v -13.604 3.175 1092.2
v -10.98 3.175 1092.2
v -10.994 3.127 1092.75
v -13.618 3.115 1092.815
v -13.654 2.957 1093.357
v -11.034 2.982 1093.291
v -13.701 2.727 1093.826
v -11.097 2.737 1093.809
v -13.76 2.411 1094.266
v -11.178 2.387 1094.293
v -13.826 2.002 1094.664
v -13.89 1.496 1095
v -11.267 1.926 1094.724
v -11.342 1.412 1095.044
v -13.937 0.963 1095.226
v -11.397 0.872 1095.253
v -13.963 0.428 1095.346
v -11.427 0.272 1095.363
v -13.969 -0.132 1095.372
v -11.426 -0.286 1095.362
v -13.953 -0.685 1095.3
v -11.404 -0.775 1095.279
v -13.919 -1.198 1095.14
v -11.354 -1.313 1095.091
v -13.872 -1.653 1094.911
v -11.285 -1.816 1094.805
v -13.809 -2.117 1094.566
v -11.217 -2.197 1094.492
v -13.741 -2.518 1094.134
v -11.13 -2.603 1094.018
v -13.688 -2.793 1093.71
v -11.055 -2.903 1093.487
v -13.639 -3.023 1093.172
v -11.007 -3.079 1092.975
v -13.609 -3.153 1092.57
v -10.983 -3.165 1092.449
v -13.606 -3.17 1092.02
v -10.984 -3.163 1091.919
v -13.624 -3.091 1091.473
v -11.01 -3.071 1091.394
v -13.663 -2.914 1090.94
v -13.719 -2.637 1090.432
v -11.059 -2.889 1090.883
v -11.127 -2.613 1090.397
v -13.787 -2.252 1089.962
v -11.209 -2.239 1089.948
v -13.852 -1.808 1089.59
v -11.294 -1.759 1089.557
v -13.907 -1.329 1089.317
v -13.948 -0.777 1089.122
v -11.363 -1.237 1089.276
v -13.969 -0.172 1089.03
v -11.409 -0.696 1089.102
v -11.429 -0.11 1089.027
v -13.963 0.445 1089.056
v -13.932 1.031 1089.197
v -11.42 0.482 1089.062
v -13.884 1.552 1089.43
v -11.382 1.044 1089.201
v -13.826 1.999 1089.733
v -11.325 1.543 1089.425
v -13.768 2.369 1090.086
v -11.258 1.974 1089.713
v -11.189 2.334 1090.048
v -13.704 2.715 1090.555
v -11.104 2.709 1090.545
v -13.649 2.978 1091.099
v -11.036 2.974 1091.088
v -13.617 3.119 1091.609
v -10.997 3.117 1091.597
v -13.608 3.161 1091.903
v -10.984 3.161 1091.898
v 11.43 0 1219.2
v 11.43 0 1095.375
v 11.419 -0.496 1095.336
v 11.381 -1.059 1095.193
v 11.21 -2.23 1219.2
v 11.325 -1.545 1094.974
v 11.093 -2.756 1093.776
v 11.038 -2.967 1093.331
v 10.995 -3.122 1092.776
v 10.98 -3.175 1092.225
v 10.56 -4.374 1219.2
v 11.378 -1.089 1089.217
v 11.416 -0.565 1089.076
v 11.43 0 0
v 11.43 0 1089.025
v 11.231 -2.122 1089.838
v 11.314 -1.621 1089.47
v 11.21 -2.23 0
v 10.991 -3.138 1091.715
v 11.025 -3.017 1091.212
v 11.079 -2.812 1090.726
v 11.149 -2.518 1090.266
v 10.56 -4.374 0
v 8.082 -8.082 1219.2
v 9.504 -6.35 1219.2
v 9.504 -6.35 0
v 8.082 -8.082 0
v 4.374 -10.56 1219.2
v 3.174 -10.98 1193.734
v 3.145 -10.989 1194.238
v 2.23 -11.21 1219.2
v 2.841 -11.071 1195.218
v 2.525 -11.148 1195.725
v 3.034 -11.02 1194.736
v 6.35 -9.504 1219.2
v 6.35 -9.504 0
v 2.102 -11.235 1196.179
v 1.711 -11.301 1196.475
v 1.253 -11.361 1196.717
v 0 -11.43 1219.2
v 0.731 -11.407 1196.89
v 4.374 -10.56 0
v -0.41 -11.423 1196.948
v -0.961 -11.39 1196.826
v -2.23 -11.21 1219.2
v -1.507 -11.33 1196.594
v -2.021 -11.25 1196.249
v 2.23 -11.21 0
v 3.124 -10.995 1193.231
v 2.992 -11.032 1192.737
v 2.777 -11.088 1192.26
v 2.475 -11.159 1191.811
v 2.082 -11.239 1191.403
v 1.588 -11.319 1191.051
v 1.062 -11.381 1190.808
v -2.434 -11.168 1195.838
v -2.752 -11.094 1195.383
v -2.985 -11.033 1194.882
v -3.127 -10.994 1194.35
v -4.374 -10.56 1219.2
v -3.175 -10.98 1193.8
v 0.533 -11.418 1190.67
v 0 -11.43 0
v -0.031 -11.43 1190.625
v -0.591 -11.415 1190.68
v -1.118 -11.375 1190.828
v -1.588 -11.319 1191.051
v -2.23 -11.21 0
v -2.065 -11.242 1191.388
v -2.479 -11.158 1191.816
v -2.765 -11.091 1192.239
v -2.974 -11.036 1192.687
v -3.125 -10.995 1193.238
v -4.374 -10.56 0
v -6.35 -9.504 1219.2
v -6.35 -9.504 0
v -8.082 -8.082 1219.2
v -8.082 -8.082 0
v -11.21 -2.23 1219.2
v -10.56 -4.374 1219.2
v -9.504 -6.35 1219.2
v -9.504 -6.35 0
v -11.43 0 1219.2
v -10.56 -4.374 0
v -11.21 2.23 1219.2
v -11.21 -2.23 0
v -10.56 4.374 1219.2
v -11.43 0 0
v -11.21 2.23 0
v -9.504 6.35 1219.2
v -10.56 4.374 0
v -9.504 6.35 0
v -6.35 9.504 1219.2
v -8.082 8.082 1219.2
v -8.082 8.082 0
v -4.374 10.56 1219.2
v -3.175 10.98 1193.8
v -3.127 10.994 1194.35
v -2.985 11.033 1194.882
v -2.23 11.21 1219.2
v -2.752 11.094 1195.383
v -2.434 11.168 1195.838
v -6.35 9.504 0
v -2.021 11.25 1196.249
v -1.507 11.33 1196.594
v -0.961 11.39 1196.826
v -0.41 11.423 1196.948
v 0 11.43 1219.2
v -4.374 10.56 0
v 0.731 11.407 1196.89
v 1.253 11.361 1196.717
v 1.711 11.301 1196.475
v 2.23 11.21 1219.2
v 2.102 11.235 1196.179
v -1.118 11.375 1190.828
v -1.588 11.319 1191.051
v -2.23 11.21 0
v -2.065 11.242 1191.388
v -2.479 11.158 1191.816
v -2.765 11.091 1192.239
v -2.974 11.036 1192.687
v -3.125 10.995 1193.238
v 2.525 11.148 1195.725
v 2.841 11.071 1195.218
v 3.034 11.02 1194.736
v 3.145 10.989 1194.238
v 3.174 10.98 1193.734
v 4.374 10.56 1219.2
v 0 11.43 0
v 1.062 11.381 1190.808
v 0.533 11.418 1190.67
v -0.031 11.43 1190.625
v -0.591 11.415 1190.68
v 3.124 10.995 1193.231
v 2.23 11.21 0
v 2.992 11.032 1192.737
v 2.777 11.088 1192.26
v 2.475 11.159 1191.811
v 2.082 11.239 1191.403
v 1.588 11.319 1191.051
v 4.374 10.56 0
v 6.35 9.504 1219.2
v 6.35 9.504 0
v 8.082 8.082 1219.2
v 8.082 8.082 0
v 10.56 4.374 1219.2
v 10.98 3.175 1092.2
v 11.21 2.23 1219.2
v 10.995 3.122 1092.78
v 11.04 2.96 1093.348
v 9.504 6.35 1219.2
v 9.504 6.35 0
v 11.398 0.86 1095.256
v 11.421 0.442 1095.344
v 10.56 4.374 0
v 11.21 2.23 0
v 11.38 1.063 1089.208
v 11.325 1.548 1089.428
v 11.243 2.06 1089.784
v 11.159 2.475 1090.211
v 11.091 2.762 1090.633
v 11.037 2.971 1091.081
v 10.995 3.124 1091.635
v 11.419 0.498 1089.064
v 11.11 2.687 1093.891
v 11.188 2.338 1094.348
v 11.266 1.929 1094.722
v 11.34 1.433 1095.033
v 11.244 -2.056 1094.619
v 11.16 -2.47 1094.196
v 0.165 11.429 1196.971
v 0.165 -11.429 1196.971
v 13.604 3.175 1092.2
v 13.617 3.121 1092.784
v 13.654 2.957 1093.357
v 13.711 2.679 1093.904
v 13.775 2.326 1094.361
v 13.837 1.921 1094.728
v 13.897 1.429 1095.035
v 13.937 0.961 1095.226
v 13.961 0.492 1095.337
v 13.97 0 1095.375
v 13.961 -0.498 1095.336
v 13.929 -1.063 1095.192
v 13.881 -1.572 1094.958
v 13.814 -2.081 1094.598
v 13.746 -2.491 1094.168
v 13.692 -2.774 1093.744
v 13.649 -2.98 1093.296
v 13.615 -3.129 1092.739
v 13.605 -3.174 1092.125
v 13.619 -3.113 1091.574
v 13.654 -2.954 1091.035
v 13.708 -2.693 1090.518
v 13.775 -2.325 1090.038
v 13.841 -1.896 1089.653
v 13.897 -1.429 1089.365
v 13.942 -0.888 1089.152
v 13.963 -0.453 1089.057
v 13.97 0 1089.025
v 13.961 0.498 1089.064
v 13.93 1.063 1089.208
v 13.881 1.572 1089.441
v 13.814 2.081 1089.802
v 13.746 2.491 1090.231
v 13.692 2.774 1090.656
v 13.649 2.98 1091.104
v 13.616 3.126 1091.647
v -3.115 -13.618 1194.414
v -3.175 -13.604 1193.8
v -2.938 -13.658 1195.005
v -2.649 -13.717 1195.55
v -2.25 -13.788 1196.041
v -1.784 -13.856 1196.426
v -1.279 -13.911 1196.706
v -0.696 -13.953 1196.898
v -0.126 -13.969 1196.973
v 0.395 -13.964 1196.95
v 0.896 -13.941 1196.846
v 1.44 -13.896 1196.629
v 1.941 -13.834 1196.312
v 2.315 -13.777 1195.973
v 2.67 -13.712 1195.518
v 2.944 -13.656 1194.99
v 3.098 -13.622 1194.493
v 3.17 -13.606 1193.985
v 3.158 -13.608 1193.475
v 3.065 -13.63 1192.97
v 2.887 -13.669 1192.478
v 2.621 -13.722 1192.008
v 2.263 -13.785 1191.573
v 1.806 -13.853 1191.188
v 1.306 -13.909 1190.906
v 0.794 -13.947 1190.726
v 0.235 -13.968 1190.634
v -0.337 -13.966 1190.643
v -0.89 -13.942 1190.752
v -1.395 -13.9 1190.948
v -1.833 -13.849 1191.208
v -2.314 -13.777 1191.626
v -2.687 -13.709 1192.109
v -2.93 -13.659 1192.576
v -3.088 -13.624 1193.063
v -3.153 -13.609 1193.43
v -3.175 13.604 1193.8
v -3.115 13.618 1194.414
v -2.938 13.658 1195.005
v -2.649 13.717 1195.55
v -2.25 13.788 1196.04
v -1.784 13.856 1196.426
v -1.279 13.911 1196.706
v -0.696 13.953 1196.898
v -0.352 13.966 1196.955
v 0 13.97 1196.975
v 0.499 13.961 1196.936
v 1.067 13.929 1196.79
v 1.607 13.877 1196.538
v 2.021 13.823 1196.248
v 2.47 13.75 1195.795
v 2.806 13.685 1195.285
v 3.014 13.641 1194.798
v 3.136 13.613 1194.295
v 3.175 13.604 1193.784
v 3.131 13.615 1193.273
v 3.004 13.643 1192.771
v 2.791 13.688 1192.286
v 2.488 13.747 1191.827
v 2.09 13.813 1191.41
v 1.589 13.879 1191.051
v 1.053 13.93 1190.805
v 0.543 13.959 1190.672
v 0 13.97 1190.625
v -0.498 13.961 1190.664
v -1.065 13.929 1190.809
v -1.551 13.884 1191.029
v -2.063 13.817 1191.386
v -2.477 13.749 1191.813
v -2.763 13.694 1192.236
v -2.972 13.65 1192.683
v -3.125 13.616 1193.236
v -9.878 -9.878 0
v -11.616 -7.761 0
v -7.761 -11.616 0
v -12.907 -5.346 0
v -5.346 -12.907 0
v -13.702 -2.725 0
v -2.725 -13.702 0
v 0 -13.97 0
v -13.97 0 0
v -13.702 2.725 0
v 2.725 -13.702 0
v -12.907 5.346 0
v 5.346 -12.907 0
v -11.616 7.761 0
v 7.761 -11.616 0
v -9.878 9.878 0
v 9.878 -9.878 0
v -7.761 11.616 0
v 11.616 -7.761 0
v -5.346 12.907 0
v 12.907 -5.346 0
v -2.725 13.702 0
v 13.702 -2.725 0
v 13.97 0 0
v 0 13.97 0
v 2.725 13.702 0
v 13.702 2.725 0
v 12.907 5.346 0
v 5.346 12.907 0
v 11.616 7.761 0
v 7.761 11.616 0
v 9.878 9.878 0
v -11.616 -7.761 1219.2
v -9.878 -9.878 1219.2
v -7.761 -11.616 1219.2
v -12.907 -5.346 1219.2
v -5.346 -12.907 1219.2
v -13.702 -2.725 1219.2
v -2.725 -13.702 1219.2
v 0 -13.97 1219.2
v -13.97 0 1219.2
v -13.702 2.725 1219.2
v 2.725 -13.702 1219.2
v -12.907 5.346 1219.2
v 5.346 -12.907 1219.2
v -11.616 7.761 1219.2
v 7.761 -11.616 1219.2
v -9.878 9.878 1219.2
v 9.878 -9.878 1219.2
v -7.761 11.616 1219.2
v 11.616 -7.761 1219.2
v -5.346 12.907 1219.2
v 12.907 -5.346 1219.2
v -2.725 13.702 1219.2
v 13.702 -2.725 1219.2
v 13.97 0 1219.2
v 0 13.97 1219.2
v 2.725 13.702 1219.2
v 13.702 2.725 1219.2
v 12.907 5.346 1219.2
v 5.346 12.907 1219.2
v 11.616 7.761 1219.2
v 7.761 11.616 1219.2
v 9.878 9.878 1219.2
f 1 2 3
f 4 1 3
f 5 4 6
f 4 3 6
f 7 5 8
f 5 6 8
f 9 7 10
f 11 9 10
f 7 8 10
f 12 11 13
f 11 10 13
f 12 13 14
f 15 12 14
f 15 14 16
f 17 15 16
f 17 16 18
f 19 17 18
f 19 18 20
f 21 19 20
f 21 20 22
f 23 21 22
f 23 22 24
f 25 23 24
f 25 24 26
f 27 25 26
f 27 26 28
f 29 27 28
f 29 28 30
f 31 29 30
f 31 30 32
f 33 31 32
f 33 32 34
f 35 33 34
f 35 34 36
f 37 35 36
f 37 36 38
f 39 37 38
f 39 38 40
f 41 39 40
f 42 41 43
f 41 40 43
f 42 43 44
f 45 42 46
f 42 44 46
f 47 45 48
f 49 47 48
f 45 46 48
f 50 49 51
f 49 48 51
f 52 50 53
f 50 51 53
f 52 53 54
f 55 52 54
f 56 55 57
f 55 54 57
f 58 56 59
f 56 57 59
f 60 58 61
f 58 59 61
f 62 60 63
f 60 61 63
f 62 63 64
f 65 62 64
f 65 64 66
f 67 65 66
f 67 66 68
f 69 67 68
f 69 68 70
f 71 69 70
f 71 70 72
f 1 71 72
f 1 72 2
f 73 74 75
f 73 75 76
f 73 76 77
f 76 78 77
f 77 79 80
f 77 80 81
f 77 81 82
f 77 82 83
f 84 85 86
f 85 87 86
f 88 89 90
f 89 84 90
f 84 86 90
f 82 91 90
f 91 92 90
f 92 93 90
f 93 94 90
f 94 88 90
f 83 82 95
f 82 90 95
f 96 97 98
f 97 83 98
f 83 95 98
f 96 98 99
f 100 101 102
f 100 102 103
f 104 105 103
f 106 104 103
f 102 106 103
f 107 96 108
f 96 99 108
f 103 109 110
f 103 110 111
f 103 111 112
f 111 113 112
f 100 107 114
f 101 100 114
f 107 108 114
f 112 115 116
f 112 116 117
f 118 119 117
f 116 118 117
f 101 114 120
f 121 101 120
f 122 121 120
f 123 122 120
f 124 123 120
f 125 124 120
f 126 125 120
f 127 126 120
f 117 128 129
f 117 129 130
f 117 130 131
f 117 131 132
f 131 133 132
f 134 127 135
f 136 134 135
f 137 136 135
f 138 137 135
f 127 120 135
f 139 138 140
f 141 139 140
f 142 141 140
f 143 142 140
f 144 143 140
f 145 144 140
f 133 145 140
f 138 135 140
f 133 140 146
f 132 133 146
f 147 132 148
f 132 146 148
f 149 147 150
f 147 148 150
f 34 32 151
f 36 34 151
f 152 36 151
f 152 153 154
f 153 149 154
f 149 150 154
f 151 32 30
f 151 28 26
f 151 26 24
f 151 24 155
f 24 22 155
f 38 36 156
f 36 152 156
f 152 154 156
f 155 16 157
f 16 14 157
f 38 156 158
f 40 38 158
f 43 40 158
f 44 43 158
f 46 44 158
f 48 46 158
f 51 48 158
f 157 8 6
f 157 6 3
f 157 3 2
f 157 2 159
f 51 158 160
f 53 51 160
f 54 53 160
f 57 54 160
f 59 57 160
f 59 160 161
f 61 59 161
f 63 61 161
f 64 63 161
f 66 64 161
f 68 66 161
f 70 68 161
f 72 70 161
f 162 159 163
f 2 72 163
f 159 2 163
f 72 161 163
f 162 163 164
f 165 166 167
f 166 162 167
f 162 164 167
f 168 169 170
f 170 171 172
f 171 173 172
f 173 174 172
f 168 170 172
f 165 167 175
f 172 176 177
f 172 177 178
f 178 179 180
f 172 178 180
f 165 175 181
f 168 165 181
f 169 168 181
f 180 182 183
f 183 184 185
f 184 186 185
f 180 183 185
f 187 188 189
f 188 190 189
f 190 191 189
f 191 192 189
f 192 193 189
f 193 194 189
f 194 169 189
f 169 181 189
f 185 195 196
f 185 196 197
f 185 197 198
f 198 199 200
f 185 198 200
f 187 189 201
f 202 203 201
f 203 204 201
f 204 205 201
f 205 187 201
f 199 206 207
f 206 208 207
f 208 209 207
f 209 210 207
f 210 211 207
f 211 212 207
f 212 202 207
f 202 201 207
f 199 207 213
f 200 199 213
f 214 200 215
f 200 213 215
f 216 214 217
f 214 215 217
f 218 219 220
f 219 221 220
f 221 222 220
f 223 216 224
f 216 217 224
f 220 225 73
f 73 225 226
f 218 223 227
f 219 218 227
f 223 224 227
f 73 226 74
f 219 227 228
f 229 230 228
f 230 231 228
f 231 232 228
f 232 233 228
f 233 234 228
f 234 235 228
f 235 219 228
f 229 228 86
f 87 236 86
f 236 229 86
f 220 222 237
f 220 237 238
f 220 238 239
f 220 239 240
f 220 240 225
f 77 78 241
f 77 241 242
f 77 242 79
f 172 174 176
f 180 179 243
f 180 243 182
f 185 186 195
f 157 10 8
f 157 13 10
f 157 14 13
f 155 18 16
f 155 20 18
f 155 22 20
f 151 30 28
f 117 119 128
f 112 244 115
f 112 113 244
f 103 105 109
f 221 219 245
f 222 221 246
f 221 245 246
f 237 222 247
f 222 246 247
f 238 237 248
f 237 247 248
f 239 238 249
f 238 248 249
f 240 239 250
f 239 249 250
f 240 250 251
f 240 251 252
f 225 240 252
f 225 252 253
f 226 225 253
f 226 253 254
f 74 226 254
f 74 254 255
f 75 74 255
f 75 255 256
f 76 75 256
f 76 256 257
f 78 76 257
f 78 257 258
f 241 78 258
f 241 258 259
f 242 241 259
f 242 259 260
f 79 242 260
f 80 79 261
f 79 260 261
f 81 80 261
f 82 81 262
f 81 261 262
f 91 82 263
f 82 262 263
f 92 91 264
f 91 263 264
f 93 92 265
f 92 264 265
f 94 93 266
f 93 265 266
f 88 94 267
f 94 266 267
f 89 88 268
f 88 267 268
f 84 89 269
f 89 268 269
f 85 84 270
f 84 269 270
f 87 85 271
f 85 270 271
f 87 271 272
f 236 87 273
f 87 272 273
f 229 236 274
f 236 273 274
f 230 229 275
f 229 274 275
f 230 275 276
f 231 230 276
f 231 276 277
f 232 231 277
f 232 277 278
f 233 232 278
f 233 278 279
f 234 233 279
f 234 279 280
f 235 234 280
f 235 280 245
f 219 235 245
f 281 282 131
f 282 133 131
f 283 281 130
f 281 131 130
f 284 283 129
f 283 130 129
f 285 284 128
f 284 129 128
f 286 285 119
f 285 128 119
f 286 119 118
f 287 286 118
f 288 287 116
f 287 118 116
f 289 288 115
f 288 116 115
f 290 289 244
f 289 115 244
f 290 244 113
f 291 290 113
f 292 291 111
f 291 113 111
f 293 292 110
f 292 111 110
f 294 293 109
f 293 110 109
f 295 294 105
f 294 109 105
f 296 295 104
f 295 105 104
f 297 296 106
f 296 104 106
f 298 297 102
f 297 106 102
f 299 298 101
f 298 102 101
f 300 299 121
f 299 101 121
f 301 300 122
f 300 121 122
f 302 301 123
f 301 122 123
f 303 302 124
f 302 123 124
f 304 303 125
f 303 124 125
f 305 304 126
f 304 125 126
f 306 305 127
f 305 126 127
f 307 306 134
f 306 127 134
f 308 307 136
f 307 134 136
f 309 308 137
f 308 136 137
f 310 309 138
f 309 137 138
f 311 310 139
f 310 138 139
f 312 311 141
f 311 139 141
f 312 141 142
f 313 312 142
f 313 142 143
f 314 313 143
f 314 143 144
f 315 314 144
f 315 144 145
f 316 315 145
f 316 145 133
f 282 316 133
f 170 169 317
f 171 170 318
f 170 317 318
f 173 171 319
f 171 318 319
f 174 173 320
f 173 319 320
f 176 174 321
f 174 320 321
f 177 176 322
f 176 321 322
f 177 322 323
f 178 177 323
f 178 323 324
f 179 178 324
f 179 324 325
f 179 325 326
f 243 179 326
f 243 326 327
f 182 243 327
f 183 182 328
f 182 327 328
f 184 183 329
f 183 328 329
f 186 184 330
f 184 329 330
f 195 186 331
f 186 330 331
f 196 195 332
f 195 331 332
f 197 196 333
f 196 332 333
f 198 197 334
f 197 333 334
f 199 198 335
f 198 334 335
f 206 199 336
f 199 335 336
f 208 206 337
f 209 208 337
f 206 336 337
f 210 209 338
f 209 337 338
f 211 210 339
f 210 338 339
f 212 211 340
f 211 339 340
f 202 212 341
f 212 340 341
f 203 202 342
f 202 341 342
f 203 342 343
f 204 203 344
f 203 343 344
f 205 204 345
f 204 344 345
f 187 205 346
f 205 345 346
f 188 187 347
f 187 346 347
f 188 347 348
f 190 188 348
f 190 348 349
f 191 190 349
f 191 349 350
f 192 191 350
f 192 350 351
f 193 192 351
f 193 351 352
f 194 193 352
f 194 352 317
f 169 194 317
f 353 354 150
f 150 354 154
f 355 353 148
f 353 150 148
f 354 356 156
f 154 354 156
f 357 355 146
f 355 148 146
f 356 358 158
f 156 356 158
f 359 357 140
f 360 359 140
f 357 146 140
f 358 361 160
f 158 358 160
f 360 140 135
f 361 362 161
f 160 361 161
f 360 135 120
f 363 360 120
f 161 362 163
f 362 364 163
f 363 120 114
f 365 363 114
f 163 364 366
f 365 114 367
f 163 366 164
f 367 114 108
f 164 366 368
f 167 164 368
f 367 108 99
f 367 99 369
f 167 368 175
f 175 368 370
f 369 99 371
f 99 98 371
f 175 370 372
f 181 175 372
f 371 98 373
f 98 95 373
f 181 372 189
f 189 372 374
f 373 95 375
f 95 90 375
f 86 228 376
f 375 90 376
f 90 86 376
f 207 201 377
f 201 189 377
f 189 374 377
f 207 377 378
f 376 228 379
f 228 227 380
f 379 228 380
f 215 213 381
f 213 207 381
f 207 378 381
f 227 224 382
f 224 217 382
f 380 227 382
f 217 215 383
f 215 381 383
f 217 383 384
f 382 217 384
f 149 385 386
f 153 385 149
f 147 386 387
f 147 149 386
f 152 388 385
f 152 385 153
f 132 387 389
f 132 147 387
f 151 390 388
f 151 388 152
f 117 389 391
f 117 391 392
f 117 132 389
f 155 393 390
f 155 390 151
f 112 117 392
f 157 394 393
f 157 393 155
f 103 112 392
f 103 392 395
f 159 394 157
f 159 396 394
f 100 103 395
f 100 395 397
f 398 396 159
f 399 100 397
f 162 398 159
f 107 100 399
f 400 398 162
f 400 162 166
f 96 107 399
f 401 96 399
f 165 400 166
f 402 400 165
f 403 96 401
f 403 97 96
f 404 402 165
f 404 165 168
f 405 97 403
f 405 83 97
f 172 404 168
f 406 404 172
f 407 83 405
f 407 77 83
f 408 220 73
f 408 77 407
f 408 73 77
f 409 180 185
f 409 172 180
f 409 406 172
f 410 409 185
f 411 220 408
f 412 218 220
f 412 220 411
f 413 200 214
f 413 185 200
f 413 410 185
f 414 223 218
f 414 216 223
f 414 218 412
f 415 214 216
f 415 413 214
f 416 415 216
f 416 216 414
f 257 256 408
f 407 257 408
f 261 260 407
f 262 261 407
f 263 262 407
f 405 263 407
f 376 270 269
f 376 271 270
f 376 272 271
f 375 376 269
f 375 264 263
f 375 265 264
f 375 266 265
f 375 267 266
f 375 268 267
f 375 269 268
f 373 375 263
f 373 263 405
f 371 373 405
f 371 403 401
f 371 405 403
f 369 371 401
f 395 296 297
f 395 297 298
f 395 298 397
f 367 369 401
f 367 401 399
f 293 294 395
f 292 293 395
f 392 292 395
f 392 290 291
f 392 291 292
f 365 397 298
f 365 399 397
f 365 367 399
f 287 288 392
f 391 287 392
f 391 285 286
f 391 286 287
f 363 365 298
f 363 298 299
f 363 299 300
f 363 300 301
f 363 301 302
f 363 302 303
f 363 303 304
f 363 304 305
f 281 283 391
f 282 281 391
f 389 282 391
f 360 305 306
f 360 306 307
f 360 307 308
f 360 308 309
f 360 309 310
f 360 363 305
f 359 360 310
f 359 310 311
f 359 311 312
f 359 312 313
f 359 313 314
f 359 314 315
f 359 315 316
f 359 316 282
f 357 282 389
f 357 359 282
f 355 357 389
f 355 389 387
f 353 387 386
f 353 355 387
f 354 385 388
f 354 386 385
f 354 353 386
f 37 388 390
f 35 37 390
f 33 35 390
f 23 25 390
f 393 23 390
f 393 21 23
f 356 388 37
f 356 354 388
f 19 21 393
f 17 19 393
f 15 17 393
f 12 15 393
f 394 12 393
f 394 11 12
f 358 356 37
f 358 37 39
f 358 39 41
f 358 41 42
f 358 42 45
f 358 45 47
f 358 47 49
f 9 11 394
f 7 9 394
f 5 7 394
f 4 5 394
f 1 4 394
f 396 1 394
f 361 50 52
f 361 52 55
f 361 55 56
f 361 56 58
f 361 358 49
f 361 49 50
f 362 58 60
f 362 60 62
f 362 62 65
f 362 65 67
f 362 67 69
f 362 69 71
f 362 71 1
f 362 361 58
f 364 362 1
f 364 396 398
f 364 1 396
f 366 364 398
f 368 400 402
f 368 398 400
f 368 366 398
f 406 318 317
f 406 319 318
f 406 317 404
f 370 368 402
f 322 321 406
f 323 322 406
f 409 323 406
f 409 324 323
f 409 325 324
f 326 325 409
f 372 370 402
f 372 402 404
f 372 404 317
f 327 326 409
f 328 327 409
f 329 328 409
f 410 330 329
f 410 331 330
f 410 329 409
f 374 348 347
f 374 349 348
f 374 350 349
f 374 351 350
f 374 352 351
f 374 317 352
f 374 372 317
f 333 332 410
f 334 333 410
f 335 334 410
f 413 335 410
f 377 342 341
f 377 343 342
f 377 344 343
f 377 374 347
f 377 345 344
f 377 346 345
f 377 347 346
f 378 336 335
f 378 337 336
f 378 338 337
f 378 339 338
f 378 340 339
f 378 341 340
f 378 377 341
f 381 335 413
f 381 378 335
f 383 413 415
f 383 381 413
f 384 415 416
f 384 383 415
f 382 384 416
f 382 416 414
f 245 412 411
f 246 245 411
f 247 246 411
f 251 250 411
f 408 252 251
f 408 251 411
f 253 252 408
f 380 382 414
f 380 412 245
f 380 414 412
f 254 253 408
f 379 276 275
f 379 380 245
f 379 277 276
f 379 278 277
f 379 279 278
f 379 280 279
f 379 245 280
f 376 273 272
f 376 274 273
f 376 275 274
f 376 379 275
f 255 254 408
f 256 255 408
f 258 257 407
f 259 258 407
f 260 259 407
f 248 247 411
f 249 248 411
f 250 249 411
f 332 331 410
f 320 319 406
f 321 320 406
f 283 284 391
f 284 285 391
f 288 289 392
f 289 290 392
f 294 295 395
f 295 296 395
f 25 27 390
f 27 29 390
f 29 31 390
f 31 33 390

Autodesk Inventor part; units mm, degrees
ref_plane "XY Plane" through (0, 0, 0) normal (0, 0, 1) x (1, 0, 0)
sketch "Sketch1" plane through (0, 0, 0) normal (0, 0, 1) x (1, 0, 0)
  circle A0 centre (0, 0) radius 11.43
  circle A1 centre (0, 0) radius 13.97
  dimension "d0" = 27.94
  dimension "d1" = 22.86
extrude "Extrusion1" add sketch "Sketch1" along normal blind 1219.2
ref_plane "Work Plane3" through (13.97, 0, 0) normal (1, 0, 0) x (0, 1, 0)
sketch "Sketch3" plane through (13.97, 0, 0) normal (1, 0, 0) x (0, 1, 0)
  circle A0 centre (0, 1092.2) radius 3.175
  line L0 (13.97, 1219.2) -> (-13.97, 1219.2) projected
  point P0 (0, 0)
  dimension "d5" = 127
  dimension "d6" = 6.35
extrude "Extrusion2" cut sketch "Sketch3" against normal through all
ref_plane "Work Plane4" through (0, 13.97, 0) normal (0, 1, 0) x (-1, 0, 0)
sketch "Sketch4" plane through (0, 13.97, 0) normal (0, 1, 0) x (-1, 0, 0)
  circle A0 centre (0, 1193.8) radius 3.175
  line L0 (13.97, 1219.2) -> (-13.97, 1219.2) projected
  point P0 (0, 0)
  dimension "d9" = 6.35
  dimension "d10" = 25.4
extrude "Extrusion3" cut sketch "Sketch4" against normal through all
equation "\"d1\" = cArmInsideDiam"
equation "\"d5\" = cArmAxelDistanceFromEnd"
equation "\"d6\" = boltHolesDiam"
equation "\"d9\" = boltHolesDiam"
equation "\"d10\" = cArmHingeDistanceFromEnd"
equation "\"cArmAxelDistanceFromEnd\" = 127"
equation "\"cArmOutsideDiam\" = 27.94"
equation "\"cArmInsideDiam\" = 22.86"
equation "\"cArmLength\" = 1219.2"
equation "\"boltHolesDiam\" = 6.35"
equation "\"cArmHingeDistanceFromEnd\" = 25.4"
properties part number "roundCatapultArm"
